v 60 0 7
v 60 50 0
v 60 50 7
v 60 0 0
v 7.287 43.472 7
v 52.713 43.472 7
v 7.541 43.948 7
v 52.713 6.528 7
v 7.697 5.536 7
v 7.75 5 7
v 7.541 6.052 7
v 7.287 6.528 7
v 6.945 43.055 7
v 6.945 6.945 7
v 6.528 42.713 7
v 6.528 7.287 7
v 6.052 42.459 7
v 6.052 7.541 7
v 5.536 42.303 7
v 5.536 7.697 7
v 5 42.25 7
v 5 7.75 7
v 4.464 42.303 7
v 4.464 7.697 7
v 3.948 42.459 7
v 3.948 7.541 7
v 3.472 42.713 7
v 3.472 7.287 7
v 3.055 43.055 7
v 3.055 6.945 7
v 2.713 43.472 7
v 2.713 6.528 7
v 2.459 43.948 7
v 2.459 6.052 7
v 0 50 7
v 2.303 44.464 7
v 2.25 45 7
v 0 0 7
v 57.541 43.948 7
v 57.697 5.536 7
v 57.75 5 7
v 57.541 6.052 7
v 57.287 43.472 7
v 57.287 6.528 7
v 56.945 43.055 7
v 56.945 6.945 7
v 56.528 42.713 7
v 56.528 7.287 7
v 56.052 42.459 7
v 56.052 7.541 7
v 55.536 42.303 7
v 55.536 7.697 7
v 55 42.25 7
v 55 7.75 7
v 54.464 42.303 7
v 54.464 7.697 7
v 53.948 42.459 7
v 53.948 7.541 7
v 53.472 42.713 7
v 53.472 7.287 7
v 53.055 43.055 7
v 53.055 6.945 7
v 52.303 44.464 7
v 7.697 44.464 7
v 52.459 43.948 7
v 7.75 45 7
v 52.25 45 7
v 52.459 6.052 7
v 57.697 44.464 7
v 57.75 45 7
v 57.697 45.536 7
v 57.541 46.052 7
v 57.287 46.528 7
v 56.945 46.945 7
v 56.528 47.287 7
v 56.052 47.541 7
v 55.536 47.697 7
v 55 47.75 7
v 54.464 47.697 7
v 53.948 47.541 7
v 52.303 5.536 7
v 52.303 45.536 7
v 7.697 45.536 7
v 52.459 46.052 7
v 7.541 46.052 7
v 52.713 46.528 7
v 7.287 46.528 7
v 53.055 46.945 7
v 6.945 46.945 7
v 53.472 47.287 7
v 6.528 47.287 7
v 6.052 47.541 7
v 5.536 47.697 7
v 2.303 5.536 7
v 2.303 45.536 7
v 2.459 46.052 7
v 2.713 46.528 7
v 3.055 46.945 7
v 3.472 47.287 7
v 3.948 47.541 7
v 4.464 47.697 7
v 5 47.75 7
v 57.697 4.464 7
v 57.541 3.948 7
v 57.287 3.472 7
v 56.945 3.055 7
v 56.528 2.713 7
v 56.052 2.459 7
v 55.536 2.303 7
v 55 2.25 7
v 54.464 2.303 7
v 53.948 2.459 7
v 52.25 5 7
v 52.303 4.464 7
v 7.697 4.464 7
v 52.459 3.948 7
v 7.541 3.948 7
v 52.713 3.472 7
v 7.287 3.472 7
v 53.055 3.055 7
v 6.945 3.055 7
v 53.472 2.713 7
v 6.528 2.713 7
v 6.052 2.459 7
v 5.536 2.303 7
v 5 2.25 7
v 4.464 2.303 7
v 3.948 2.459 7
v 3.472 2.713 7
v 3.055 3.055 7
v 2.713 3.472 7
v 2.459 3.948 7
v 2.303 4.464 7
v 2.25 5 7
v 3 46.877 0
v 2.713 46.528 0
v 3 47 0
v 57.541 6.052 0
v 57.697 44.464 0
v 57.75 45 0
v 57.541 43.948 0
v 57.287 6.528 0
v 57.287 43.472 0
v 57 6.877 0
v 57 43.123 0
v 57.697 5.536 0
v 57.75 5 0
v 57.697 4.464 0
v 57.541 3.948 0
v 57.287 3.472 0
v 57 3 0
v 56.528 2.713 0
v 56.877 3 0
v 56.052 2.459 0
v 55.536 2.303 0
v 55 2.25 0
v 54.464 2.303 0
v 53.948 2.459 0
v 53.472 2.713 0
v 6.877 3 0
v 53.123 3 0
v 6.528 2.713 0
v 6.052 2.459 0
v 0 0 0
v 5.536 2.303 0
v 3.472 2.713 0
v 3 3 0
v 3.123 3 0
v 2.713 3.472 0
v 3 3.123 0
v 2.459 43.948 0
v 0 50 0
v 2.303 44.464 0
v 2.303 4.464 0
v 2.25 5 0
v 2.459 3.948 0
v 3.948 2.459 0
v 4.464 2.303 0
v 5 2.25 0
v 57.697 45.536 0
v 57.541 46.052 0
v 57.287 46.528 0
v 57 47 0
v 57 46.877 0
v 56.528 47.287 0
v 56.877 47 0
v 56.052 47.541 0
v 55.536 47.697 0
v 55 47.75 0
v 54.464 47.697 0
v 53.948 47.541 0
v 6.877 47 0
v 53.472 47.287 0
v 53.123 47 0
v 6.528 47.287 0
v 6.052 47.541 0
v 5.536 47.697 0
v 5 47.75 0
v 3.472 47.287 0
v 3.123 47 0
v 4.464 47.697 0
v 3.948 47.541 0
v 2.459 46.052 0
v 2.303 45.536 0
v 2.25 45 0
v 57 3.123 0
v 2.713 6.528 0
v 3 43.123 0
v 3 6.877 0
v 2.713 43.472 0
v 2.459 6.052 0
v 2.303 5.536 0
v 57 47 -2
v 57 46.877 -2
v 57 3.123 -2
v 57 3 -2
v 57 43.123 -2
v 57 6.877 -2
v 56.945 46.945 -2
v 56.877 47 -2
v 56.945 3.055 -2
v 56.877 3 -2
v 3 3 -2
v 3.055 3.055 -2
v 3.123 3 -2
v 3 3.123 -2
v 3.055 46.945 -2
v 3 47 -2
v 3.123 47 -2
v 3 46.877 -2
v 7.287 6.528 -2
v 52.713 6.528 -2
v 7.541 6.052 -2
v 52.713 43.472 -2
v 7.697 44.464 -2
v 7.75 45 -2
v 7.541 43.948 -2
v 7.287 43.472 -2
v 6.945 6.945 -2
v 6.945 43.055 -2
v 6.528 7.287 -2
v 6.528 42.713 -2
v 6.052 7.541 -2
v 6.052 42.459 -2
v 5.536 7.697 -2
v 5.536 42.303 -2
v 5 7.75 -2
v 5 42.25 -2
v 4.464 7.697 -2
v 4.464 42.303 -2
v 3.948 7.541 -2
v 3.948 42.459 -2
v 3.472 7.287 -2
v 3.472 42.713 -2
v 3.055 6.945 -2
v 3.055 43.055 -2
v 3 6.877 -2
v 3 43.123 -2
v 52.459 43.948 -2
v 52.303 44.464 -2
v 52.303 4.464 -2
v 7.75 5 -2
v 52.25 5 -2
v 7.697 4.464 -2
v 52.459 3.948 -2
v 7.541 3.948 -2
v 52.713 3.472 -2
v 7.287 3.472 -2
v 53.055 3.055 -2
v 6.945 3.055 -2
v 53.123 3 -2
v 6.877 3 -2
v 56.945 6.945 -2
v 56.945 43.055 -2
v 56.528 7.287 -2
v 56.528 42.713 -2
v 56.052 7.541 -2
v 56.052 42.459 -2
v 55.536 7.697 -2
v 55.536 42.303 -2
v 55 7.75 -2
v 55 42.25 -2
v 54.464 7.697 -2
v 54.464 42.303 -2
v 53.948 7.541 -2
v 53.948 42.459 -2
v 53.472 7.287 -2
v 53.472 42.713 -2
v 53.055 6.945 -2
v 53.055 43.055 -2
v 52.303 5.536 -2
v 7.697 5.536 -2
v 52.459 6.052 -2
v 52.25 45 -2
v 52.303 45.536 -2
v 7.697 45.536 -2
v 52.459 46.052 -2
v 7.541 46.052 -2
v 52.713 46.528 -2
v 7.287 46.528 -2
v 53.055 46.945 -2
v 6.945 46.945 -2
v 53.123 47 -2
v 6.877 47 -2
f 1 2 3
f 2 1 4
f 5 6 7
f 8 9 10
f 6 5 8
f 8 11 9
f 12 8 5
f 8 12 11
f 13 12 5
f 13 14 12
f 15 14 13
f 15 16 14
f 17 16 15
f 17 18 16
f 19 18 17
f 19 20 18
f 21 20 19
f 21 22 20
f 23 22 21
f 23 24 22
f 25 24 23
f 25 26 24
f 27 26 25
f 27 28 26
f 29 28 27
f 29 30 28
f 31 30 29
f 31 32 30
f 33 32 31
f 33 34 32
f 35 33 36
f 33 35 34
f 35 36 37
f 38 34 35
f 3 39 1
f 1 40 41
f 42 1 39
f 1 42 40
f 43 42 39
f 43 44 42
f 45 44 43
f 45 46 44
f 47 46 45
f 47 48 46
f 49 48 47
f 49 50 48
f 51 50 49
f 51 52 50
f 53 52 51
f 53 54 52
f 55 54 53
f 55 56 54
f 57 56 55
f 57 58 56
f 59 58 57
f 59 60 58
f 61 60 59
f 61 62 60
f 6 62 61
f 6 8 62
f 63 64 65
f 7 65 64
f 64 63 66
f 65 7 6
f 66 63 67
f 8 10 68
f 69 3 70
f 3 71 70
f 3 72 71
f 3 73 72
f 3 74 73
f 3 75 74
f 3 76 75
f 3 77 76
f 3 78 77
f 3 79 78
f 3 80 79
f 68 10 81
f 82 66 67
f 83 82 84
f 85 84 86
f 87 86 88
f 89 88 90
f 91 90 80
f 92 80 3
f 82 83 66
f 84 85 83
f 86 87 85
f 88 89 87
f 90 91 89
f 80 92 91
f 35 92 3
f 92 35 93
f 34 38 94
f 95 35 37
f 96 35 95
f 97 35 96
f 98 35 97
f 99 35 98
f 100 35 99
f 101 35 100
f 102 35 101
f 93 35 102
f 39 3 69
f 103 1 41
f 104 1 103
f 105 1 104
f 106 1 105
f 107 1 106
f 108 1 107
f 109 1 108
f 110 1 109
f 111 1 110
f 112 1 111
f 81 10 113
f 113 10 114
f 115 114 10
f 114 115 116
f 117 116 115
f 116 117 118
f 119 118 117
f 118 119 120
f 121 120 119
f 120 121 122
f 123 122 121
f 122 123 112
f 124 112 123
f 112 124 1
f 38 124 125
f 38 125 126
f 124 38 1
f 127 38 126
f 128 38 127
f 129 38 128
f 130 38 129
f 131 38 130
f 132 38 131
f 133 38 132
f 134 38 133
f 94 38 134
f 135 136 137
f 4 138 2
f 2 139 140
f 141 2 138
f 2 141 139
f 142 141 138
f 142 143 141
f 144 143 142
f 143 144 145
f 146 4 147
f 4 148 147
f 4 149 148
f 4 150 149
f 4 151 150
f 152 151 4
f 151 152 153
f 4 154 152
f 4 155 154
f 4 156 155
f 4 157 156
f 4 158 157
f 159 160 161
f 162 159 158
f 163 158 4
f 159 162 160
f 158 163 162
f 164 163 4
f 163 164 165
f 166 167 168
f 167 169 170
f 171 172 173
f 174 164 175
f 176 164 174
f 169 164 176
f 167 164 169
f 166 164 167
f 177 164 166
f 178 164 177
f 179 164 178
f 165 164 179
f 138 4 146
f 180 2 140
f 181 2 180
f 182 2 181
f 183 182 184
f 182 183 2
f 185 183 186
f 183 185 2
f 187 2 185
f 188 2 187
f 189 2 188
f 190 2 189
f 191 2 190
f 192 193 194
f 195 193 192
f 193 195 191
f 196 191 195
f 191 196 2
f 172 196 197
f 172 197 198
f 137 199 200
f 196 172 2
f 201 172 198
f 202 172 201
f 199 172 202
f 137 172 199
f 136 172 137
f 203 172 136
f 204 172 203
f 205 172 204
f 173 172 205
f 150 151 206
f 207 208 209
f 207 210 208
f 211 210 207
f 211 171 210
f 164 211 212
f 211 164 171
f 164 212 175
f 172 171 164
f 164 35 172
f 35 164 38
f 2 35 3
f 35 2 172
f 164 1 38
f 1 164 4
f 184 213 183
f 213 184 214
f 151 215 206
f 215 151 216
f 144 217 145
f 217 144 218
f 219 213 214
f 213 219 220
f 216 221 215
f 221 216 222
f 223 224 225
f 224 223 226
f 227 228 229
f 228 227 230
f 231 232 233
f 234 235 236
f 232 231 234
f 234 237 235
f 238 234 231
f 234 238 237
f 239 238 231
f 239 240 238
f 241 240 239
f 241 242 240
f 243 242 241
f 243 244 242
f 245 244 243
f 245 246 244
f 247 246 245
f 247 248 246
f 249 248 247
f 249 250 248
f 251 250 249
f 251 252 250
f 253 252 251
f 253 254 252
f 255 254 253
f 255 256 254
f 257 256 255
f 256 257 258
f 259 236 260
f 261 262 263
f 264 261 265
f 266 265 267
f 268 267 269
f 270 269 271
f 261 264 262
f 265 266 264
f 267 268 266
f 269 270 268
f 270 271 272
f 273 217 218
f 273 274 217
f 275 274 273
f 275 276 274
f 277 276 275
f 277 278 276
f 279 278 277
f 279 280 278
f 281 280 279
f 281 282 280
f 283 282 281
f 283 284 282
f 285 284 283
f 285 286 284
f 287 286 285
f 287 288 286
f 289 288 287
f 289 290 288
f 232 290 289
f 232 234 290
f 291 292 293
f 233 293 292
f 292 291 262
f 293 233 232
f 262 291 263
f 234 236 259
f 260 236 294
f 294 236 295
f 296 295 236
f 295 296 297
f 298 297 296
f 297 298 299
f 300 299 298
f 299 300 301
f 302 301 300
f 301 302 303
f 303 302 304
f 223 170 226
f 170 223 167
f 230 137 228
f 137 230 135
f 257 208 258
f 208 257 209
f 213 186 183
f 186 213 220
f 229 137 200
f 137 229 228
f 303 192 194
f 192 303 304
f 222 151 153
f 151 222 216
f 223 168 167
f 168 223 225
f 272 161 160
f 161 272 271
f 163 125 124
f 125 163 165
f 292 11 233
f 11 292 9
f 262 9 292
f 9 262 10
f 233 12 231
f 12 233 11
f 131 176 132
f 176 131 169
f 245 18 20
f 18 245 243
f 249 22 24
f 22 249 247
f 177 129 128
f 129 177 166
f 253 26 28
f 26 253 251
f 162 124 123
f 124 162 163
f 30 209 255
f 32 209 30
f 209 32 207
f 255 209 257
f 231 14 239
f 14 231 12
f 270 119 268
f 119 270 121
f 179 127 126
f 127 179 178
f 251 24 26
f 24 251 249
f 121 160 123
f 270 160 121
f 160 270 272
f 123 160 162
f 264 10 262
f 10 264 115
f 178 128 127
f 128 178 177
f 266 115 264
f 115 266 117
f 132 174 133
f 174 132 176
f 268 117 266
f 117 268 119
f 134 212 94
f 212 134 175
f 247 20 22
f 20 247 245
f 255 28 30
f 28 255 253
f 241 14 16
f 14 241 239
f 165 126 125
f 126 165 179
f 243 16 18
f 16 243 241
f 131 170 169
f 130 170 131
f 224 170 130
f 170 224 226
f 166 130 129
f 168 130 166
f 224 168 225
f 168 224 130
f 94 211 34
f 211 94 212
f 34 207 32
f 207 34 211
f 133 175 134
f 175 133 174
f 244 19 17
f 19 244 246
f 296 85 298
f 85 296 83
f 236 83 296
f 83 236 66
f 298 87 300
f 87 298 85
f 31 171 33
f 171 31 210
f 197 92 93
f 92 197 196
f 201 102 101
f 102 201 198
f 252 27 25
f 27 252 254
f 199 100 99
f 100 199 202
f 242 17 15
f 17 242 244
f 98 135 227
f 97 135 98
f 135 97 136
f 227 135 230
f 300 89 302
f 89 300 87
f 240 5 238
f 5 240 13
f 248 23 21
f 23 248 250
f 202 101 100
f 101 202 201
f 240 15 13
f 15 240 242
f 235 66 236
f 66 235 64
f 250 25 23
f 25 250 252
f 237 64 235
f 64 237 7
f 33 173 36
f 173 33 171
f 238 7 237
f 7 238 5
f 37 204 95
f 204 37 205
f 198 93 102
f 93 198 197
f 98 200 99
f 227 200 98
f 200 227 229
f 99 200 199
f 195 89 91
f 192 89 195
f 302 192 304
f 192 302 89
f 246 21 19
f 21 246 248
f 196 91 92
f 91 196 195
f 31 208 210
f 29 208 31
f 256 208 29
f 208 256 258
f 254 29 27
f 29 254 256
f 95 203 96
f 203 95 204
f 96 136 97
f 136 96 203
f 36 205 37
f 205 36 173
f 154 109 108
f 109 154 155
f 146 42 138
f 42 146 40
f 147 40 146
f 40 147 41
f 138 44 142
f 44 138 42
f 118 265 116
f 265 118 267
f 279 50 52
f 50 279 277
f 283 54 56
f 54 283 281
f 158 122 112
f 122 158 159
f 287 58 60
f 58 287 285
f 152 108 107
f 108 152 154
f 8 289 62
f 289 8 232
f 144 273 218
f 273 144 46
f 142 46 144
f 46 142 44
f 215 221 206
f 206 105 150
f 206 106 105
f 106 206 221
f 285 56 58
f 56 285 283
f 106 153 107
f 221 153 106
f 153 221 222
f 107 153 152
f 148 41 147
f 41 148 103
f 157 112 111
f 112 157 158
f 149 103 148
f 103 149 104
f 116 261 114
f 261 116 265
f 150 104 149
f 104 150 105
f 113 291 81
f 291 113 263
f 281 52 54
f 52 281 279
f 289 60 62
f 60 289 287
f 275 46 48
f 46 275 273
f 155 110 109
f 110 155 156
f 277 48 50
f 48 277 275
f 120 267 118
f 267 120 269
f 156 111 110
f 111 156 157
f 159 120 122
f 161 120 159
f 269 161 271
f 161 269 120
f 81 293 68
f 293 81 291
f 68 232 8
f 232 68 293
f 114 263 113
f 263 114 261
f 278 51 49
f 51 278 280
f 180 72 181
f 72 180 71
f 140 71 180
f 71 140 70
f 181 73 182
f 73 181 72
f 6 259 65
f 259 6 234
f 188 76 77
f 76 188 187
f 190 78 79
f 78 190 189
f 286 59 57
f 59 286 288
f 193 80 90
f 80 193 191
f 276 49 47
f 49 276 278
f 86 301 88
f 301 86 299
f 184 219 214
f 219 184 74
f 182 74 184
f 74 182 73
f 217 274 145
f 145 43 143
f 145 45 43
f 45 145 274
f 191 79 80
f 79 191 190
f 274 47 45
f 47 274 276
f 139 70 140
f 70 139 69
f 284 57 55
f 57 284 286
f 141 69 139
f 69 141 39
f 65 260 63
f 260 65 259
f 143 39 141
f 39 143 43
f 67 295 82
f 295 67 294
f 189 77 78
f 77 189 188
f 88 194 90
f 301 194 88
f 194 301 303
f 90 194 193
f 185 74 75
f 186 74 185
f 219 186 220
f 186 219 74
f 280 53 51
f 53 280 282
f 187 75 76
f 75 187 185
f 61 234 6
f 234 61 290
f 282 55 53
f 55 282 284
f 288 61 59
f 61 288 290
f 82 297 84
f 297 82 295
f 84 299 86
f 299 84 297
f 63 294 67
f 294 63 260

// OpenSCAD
$fn = 32;

// ----------------------------------------------------------------------
// Enclosure lid: 60 x 50 x 7 mm, 4 bolt holes
// ----------------------------------------------------------------------

// --- parameters (mm) ---
length = 60;              // lid length, X
width = 50;               // lid width, Y
plate_t = 7;              // lid plate thickness
bolt_d = 5.5;             // bolt clearance
boss_lip = 5;             // bolt hole inset from the corner
sink = 1;                 // overlap of the lip and ribs into the plate
lip_h = 3;                // lip height below the plate
lip_wall = 3;             // lip wall thickness

module plate() {
  cube([length, width, plate_t]);
  /* lip that drops into the housing opening, sunk into the plate */
  translate([lip_wall, lip_wall, -lip_h + sink]) cube([length - 2 * lip_wall, width - 2 * lip_wall, lip_h]);
}

difference() {
  plate();
  /* bolt pattern matching the corner bosses */
  for (sx = [0, 1]) for (sy = [0, 1])
    translate([sx * (length - 2 * boss_lip) + boss_lip, sy * (width - 2 * boss_lip) + boss_lip, -lip_h - 1])
      cylinder(h = plate_t + lip_h + 2, d = bolt_d);
}
